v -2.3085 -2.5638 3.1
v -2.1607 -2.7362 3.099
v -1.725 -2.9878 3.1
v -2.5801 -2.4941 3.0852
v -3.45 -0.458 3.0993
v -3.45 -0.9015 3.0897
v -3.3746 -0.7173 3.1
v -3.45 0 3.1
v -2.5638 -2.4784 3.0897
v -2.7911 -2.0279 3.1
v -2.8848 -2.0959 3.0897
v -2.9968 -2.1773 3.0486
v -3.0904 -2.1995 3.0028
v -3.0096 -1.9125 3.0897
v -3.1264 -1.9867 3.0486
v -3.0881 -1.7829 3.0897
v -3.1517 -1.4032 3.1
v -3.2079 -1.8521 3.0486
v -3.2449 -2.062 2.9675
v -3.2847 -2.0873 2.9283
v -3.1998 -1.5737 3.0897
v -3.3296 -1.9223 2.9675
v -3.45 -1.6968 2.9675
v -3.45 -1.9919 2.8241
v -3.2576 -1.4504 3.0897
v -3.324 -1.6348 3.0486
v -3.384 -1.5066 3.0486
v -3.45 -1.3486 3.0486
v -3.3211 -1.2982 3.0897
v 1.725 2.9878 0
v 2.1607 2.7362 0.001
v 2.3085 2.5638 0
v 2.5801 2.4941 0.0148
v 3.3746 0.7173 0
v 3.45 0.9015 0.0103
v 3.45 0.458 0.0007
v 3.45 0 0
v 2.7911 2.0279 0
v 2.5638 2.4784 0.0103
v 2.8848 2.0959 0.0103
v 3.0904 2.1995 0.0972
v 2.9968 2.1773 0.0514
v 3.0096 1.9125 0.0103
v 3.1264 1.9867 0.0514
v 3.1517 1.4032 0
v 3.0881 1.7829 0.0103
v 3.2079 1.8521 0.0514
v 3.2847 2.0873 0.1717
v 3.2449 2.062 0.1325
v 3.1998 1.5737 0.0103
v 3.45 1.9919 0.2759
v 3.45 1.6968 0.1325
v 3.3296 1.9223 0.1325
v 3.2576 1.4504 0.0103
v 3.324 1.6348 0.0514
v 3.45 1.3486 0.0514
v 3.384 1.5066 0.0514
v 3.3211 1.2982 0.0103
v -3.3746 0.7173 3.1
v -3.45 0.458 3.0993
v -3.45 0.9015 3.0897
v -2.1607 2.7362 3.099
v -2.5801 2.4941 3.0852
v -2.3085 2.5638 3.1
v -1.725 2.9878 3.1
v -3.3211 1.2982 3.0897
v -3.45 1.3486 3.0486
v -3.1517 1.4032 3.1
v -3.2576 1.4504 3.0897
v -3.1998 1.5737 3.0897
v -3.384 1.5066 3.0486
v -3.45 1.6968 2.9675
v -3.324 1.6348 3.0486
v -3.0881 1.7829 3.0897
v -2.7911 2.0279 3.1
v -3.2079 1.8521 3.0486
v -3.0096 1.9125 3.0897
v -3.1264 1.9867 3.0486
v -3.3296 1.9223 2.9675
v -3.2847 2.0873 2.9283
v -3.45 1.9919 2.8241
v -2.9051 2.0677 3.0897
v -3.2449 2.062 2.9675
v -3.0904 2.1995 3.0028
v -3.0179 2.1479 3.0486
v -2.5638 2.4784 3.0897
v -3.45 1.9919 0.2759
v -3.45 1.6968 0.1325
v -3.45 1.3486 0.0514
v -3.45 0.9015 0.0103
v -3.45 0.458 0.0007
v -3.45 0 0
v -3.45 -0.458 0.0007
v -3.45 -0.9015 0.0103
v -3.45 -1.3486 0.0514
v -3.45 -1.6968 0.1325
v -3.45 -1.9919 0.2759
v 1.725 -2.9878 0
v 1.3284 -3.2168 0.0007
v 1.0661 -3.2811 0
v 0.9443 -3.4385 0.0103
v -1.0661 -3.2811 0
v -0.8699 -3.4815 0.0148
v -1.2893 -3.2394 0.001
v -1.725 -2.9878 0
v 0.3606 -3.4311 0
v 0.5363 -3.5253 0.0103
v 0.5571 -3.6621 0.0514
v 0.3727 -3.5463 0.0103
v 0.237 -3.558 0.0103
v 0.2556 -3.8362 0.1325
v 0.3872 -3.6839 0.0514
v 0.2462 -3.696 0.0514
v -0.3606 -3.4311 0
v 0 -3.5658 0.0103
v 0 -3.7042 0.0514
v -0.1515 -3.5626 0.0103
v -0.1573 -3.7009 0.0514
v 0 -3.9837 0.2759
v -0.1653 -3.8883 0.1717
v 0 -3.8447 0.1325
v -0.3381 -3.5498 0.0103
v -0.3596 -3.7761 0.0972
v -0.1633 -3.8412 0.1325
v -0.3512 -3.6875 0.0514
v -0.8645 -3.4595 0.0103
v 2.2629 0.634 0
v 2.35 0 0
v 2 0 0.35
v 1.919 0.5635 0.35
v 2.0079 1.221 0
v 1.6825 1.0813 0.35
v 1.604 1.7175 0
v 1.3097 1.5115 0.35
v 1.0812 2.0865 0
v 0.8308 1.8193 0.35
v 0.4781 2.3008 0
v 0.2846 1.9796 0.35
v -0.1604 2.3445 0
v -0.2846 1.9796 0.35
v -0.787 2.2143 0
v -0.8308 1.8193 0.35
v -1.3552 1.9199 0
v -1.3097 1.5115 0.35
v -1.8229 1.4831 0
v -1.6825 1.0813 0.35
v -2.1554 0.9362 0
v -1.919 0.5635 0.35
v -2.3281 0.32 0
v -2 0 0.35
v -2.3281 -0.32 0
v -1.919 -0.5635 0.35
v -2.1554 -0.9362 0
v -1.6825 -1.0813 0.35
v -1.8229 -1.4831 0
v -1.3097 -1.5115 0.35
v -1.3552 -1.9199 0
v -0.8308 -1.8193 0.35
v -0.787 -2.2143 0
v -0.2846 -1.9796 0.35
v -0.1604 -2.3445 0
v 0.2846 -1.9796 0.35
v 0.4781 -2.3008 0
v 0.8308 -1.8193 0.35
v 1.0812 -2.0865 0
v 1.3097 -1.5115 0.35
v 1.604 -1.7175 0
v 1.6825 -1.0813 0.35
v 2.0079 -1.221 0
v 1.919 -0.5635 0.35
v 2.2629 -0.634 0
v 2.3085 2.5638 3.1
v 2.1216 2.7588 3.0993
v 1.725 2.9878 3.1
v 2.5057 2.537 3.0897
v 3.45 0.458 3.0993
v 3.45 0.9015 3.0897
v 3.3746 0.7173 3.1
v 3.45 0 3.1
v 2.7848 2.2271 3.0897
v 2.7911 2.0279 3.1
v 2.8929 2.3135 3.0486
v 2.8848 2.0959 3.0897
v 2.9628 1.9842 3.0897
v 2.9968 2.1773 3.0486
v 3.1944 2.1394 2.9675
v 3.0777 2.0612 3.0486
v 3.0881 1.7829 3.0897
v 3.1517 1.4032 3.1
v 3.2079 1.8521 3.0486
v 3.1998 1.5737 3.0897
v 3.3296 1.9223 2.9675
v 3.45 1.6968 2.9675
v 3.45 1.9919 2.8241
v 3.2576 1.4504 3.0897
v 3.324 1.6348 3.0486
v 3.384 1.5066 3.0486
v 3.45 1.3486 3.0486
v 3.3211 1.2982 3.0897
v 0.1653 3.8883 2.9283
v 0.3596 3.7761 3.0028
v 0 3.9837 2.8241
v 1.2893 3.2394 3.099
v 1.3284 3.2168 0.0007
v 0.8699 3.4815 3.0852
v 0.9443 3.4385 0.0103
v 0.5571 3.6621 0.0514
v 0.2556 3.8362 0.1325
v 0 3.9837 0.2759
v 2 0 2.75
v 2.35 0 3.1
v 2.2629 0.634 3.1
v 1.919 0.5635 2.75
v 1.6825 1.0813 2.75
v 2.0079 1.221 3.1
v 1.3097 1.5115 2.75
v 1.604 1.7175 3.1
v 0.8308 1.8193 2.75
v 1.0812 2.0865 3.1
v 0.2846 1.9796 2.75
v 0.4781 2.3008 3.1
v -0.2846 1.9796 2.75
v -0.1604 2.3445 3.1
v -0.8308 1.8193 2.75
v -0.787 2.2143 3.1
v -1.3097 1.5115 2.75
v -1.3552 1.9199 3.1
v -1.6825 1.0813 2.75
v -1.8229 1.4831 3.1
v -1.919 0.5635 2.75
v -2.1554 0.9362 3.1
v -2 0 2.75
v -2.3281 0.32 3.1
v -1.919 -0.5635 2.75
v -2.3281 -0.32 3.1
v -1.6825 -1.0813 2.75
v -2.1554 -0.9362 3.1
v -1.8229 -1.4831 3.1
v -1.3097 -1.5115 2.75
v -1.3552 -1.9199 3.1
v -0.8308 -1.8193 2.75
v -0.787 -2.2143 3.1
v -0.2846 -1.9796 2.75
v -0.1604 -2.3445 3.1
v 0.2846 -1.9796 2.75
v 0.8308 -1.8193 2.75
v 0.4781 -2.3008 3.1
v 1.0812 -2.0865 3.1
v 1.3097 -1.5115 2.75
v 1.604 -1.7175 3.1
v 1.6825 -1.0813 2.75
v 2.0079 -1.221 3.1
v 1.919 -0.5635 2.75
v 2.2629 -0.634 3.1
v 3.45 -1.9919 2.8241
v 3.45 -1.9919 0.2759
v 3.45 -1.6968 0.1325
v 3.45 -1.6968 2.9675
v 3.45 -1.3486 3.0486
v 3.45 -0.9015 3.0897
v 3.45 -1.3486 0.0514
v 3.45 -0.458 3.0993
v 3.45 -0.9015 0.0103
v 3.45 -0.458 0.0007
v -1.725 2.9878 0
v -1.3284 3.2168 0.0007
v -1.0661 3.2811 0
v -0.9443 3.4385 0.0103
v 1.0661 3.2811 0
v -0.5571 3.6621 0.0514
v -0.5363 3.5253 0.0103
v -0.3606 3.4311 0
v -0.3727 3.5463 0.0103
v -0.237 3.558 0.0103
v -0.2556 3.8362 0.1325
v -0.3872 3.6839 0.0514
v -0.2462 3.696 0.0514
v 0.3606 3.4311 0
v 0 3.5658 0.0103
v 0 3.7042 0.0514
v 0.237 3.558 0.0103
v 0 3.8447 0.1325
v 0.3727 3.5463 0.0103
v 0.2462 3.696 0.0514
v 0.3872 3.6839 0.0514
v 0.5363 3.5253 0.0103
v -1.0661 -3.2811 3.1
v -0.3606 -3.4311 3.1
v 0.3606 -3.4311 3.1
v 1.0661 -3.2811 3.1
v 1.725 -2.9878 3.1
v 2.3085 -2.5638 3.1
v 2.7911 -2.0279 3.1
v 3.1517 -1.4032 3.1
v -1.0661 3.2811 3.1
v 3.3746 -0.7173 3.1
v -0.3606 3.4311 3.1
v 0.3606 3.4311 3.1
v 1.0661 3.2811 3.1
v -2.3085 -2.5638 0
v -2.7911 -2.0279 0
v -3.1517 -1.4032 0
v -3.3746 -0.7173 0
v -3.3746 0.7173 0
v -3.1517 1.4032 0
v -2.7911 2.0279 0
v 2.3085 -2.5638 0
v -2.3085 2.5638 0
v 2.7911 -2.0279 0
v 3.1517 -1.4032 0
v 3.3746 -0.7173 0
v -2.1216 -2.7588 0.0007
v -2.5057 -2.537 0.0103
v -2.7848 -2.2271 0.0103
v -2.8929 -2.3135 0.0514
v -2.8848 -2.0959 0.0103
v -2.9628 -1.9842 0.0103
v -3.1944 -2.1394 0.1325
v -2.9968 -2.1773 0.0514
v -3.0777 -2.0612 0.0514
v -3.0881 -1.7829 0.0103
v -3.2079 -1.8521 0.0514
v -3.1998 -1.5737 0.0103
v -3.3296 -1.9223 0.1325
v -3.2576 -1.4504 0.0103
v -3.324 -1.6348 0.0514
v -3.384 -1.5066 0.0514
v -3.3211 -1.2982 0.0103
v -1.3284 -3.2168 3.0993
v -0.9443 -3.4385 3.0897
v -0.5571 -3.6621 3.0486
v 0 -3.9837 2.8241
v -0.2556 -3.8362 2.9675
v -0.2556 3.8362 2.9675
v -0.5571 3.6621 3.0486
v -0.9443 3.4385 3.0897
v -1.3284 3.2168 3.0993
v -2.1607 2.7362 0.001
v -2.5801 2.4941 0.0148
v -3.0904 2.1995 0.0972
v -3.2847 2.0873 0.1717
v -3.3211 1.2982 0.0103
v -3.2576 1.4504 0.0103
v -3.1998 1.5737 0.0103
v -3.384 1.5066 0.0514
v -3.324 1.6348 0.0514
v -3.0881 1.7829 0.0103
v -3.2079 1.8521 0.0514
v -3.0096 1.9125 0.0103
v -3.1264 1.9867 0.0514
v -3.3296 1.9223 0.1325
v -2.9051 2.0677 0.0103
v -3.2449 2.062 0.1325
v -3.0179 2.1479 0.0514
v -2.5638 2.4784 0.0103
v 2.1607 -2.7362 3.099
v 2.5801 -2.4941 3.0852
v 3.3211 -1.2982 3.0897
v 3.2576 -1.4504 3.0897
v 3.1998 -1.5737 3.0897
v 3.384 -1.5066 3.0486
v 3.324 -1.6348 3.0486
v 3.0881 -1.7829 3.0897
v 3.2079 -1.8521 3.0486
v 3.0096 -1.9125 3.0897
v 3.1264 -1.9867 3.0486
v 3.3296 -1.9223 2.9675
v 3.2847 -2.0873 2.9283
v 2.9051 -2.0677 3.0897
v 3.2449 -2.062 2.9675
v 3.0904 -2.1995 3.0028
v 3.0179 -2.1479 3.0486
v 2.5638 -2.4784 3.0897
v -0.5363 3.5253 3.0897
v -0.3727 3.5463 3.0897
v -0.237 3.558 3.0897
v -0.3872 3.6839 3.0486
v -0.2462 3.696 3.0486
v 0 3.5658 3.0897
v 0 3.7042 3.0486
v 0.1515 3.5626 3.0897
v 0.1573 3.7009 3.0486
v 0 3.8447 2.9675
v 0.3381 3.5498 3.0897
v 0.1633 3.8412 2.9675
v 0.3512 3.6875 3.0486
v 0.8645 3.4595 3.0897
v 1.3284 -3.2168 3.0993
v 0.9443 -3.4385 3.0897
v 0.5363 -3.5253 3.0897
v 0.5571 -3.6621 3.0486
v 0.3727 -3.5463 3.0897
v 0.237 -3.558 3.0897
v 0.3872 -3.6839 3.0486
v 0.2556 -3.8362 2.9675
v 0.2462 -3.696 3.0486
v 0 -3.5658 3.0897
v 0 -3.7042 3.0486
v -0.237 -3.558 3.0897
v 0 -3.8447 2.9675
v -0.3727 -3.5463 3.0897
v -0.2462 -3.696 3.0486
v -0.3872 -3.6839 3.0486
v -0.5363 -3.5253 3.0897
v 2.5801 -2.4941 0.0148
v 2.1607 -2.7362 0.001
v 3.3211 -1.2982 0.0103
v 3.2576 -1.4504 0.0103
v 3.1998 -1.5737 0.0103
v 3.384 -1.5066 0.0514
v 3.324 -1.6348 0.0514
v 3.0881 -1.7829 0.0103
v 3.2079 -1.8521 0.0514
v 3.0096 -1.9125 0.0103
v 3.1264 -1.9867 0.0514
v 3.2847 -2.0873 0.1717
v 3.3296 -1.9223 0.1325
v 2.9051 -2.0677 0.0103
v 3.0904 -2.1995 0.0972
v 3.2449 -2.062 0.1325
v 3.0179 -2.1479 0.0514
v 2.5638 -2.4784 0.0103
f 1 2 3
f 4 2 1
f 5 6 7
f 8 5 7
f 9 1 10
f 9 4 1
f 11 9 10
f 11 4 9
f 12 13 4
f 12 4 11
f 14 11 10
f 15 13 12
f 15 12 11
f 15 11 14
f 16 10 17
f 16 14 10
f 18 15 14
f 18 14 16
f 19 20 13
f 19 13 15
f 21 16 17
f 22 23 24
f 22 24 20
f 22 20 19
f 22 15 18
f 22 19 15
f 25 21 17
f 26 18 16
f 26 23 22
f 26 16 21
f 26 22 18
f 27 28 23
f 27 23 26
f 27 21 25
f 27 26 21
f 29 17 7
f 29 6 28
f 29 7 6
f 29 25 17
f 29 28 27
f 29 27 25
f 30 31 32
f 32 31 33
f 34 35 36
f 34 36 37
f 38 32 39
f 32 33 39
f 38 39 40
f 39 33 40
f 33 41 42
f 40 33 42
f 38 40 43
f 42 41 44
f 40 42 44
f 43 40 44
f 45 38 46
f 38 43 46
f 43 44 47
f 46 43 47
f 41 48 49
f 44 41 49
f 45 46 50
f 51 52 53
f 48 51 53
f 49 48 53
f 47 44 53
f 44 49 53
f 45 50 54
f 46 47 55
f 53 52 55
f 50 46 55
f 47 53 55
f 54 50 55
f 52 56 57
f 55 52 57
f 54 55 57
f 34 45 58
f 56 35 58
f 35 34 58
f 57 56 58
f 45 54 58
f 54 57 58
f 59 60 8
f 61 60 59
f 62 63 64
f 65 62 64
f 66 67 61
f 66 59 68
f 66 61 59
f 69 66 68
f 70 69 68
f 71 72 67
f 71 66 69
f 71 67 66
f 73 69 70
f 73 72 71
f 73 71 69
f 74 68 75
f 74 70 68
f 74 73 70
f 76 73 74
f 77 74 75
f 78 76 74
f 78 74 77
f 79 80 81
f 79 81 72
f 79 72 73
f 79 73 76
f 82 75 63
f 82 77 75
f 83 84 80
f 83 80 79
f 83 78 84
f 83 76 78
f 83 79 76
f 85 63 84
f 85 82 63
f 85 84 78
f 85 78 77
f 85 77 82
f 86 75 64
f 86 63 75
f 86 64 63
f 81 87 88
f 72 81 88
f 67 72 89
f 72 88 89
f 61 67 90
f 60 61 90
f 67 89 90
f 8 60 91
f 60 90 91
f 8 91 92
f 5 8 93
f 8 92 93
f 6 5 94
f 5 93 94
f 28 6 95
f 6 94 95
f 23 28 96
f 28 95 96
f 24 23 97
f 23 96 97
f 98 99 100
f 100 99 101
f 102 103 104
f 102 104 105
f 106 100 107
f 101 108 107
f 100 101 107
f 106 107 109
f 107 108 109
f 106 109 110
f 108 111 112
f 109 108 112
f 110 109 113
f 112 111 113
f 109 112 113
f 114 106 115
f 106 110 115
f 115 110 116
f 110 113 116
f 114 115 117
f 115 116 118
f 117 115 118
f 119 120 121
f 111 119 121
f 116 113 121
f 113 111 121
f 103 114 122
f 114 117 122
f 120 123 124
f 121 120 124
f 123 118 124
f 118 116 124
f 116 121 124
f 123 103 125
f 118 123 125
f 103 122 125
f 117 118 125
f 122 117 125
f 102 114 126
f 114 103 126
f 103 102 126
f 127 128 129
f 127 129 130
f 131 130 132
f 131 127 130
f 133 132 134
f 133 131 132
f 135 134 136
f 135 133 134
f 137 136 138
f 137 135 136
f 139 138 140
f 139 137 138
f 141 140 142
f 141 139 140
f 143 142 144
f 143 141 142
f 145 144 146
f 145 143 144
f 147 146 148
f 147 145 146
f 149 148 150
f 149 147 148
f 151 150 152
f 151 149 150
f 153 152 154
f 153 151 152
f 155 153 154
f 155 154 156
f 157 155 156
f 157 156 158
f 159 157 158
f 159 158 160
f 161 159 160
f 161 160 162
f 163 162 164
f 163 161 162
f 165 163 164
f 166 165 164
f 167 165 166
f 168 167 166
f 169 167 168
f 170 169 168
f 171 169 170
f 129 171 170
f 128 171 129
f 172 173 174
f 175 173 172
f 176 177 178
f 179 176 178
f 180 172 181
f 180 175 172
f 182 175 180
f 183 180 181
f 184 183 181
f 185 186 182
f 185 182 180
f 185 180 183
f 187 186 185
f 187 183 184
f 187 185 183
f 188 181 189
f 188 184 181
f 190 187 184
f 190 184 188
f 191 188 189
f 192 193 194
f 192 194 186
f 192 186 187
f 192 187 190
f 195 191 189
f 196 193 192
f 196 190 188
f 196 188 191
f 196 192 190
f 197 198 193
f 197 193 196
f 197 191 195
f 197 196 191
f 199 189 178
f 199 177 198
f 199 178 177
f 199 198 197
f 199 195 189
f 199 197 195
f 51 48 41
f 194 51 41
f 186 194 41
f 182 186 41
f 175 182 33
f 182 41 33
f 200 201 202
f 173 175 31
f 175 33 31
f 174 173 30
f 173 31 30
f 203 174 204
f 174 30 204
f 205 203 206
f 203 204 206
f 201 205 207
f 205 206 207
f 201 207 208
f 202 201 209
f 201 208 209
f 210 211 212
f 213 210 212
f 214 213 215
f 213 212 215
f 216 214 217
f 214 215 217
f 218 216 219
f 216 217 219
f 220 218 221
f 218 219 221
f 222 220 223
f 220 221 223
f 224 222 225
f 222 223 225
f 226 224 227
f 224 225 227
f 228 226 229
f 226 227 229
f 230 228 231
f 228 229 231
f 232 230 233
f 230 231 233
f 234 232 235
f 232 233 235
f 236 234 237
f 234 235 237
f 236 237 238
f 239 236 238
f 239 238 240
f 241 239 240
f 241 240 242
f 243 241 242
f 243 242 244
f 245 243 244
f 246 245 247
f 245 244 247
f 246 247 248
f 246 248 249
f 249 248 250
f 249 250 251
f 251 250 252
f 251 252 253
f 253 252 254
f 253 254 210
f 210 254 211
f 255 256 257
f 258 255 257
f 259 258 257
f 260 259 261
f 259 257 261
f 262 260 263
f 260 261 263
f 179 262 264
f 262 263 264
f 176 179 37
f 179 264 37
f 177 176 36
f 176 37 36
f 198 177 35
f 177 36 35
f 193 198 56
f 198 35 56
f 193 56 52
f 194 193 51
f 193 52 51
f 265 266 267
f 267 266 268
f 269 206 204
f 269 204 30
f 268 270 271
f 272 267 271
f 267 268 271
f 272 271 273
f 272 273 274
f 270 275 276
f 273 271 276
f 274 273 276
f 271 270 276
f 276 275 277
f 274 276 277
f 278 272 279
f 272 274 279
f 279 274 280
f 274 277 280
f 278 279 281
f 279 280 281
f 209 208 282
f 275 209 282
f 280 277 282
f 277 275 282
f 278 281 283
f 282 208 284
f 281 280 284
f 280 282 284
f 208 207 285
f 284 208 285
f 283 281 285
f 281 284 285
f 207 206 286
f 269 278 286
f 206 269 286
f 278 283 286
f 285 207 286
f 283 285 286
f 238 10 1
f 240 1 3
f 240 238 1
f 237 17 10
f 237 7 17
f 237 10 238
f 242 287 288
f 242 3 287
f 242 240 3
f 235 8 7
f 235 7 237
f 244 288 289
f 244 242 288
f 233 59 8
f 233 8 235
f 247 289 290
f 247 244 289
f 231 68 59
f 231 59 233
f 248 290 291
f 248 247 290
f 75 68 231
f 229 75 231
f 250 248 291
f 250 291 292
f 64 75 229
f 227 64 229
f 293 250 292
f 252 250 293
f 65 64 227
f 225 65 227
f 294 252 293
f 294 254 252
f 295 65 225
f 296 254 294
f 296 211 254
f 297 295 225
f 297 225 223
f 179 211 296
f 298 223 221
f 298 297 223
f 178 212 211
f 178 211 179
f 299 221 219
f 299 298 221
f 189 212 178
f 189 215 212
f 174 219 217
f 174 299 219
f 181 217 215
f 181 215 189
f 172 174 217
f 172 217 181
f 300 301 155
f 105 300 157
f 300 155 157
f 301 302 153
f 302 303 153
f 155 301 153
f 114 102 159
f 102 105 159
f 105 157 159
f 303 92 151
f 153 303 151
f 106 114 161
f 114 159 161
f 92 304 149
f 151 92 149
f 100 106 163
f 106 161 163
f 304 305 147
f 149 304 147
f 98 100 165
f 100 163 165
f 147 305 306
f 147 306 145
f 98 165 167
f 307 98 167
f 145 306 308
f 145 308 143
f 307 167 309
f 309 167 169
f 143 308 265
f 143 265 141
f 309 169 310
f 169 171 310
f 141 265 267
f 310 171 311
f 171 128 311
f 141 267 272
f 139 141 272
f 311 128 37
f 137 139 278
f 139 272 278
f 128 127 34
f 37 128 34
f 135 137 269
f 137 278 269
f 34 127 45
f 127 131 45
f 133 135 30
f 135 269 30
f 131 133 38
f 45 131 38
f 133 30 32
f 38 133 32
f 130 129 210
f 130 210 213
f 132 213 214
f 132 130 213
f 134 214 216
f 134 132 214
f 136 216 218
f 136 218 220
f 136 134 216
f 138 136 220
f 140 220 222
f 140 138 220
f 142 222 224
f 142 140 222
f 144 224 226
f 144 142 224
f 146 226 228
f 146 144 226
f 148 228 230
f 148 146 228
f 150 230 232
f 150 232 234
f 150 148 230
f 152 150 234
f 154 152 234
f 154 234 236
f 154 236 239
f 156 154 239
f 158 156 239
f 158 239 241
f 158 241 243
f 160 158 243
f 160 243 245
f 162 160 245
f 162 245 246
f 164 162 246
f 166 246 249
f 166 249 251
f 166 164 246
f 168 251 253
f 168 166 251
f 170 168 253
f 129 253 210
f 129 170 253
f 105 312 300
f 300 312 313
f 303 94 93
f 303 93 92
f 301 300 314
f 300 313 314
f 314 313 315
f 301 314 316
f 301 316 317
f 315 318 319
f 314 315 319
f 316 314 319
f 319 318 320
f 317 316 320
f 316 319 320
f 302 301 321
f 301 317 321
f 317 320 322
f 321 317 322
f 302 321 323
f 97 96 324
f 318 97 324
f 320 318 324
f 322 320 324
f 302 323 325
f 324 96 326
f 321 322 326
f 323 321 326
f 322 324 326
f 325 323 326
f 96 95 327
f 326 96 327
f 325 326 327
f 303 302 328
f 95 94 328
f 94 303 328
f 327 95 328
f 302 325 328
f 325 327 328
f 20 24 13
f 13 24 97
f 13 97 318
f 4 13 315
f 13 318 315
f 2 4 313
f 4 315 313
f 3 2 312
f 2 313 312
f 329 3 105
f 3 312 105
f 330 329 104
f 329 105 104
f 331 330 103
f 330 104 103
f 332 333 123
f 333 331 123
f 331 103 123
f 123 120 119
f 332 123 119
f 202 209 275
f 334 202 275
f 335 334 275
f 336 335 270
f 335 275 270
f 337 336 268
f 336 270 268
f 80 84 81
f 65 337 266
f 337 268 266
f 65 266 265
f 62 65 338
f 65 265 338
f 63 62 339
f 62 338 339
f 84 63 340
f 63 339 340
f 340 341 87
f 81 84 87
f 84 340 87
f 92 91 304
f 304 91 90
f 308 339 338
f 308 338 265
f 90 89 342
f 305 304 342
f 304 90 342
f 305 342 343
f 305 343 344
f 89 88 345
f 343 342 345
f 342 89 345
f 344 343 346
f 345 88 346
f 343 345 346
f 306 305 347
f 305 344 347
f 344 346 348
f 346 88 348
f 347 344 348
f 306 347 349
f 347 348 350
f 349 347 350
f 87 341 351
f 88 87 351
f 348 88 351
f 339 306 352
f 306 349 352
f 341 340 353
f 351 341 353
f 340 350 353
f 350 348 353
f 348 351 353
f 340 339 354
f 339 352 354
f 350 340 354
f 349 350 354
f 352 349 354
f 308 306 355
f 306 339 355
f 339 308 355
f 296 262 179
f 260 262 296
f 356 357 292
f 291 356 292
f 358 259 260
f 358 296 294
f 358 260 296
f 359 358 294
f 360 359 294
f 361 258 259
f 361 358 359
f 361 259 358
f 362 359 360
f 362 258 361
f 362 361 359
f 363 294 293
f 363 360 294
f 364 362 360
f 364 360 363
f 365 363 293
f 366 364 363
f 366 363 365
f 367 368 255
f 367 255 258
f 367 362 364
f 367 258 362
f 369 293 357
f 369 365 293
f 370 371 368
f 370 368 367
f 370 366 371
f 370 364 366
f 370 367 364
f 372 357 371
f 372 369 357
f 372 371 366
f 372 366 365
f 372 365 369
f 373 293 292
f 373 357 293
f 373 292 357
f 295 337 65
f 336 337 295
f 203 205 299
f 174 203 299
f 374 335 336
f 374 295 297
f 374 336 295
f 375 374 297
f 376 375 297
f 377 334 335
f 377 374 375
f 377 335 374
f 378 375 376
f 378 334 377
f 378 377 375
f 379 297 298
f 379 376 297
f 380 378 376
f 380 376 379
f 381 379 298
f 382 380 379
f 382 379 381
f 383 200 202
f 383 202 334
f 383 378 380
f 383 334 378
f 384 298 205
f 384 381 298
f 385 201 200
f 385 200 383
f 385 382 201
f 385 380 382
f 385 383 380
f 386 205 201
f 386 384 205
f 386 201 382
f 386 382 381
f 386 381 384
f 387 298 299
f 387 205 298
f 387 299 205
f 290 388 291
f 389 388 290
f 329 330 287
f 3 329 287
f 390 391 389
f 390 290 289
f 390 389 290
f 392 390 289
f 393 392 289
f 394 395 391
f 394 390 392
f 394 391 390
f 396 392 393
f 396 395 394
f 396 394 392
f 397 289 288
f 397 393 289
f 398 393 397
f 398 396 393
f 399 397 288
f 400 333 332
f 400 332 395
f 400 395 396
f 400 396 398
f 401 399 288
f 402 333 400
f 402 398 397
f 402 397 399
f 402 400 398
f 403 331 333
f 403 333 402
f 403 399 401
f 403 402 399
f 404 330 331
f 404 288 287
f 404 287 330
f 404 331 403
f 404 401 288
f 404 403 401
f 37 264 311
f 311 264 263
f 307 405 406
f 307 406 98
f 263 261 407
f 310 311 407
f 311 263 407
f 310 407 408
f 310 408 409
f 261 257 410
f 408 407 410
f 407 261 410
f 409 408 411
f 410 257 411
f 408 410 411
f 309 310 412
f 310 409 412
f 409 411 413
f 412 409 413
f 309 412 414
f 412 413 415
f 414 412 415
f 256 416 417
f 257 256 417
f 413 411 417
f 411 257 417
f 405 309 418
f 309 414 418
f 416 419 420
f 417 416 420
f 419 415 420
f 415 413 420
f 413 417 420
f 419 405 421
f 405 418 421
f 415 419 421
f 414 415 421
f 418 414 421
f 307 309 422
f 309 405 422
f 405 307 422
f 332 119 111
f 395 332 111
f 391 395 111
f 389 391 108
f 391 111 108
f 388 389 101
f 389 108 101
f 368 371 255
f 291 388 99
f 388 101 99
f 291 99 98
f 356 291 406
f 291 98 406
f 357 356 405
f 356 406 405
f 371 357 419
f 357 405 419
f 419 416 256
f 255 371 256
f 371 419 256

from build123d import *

# Parameters (mm, degrees)
SKETCH1_R           = 2
BOSS_EXTRUDE1_DEPTH = 3.1
CHAMFER1_SIZE       = 0.35


with BuildPart() as part:
    # Sketch1 → Boss-Extrude1 (new body)
    with BuildSketch(Plane.XY):
        Polygon((3.45, 1.991858429), (0, 3.983716857), (-3.45, 1.991858429), (-3.45, -1.991858429), (0, -3.983716857), (3.45, -1.991858429), align=None)
        Circle(SKETCH1_R, mode=Mode.SUBTRACT)
    extrude(amount=BOSS_EXTRUDE1_DEPTH)

    # Chamfer1
    chamfer1_edges = [part.edges().sort_by_distance(p)[0] for p in [
        (-2, 0, 0),
        (-2, 0, 3.1),
    ]]
    chamfer(chamfer1_edges, length=CHAMFER1_SIZE)

    # Sketch2 → Cut-Revolve1 (revolve, cut)
    with BuildSketch(Plane(origin=(0, 0, 0), x_dir=(1, 0, 0), z_dir=(0, 1, 0))):
        with BuildLine():
            Line((-4, -0.3), (-4.500819954, -0.3))
            Line((-4.500819954, -0.3), (-4.500819954, 0.361239255))
            Line((-4.500819954, 0.361239255), (-3.45, 0.361239255))
            Line((-3.45, 0.361239255), (-3.45, 0))
            ThreePointArc((-3.45, 0), (-3.763249102, -0.079876646), (-4, -0.3))
        make_face()
        with BuildLine():
            Line((-3.45, -3.461239255), (-3.45, -3.1))
            ThreePointArc((-3.45, -3.1), (-3.763249102, -3.020123354), (-4, -2.8))
            Line((-4, -2.8), (-4.500819954, -2.8))
            Line((-4.500819954, -2.8), (-4.500819954, -3.461239255))
            Line((-4.500819954, -3.461239255), (-3.45, -3.461239255))
        make_face()
    revolve(axis=Axis((0, 0, 1.55), (0, 0, -1)), mode=Mode.SUBTRACT)


solid = part.part
